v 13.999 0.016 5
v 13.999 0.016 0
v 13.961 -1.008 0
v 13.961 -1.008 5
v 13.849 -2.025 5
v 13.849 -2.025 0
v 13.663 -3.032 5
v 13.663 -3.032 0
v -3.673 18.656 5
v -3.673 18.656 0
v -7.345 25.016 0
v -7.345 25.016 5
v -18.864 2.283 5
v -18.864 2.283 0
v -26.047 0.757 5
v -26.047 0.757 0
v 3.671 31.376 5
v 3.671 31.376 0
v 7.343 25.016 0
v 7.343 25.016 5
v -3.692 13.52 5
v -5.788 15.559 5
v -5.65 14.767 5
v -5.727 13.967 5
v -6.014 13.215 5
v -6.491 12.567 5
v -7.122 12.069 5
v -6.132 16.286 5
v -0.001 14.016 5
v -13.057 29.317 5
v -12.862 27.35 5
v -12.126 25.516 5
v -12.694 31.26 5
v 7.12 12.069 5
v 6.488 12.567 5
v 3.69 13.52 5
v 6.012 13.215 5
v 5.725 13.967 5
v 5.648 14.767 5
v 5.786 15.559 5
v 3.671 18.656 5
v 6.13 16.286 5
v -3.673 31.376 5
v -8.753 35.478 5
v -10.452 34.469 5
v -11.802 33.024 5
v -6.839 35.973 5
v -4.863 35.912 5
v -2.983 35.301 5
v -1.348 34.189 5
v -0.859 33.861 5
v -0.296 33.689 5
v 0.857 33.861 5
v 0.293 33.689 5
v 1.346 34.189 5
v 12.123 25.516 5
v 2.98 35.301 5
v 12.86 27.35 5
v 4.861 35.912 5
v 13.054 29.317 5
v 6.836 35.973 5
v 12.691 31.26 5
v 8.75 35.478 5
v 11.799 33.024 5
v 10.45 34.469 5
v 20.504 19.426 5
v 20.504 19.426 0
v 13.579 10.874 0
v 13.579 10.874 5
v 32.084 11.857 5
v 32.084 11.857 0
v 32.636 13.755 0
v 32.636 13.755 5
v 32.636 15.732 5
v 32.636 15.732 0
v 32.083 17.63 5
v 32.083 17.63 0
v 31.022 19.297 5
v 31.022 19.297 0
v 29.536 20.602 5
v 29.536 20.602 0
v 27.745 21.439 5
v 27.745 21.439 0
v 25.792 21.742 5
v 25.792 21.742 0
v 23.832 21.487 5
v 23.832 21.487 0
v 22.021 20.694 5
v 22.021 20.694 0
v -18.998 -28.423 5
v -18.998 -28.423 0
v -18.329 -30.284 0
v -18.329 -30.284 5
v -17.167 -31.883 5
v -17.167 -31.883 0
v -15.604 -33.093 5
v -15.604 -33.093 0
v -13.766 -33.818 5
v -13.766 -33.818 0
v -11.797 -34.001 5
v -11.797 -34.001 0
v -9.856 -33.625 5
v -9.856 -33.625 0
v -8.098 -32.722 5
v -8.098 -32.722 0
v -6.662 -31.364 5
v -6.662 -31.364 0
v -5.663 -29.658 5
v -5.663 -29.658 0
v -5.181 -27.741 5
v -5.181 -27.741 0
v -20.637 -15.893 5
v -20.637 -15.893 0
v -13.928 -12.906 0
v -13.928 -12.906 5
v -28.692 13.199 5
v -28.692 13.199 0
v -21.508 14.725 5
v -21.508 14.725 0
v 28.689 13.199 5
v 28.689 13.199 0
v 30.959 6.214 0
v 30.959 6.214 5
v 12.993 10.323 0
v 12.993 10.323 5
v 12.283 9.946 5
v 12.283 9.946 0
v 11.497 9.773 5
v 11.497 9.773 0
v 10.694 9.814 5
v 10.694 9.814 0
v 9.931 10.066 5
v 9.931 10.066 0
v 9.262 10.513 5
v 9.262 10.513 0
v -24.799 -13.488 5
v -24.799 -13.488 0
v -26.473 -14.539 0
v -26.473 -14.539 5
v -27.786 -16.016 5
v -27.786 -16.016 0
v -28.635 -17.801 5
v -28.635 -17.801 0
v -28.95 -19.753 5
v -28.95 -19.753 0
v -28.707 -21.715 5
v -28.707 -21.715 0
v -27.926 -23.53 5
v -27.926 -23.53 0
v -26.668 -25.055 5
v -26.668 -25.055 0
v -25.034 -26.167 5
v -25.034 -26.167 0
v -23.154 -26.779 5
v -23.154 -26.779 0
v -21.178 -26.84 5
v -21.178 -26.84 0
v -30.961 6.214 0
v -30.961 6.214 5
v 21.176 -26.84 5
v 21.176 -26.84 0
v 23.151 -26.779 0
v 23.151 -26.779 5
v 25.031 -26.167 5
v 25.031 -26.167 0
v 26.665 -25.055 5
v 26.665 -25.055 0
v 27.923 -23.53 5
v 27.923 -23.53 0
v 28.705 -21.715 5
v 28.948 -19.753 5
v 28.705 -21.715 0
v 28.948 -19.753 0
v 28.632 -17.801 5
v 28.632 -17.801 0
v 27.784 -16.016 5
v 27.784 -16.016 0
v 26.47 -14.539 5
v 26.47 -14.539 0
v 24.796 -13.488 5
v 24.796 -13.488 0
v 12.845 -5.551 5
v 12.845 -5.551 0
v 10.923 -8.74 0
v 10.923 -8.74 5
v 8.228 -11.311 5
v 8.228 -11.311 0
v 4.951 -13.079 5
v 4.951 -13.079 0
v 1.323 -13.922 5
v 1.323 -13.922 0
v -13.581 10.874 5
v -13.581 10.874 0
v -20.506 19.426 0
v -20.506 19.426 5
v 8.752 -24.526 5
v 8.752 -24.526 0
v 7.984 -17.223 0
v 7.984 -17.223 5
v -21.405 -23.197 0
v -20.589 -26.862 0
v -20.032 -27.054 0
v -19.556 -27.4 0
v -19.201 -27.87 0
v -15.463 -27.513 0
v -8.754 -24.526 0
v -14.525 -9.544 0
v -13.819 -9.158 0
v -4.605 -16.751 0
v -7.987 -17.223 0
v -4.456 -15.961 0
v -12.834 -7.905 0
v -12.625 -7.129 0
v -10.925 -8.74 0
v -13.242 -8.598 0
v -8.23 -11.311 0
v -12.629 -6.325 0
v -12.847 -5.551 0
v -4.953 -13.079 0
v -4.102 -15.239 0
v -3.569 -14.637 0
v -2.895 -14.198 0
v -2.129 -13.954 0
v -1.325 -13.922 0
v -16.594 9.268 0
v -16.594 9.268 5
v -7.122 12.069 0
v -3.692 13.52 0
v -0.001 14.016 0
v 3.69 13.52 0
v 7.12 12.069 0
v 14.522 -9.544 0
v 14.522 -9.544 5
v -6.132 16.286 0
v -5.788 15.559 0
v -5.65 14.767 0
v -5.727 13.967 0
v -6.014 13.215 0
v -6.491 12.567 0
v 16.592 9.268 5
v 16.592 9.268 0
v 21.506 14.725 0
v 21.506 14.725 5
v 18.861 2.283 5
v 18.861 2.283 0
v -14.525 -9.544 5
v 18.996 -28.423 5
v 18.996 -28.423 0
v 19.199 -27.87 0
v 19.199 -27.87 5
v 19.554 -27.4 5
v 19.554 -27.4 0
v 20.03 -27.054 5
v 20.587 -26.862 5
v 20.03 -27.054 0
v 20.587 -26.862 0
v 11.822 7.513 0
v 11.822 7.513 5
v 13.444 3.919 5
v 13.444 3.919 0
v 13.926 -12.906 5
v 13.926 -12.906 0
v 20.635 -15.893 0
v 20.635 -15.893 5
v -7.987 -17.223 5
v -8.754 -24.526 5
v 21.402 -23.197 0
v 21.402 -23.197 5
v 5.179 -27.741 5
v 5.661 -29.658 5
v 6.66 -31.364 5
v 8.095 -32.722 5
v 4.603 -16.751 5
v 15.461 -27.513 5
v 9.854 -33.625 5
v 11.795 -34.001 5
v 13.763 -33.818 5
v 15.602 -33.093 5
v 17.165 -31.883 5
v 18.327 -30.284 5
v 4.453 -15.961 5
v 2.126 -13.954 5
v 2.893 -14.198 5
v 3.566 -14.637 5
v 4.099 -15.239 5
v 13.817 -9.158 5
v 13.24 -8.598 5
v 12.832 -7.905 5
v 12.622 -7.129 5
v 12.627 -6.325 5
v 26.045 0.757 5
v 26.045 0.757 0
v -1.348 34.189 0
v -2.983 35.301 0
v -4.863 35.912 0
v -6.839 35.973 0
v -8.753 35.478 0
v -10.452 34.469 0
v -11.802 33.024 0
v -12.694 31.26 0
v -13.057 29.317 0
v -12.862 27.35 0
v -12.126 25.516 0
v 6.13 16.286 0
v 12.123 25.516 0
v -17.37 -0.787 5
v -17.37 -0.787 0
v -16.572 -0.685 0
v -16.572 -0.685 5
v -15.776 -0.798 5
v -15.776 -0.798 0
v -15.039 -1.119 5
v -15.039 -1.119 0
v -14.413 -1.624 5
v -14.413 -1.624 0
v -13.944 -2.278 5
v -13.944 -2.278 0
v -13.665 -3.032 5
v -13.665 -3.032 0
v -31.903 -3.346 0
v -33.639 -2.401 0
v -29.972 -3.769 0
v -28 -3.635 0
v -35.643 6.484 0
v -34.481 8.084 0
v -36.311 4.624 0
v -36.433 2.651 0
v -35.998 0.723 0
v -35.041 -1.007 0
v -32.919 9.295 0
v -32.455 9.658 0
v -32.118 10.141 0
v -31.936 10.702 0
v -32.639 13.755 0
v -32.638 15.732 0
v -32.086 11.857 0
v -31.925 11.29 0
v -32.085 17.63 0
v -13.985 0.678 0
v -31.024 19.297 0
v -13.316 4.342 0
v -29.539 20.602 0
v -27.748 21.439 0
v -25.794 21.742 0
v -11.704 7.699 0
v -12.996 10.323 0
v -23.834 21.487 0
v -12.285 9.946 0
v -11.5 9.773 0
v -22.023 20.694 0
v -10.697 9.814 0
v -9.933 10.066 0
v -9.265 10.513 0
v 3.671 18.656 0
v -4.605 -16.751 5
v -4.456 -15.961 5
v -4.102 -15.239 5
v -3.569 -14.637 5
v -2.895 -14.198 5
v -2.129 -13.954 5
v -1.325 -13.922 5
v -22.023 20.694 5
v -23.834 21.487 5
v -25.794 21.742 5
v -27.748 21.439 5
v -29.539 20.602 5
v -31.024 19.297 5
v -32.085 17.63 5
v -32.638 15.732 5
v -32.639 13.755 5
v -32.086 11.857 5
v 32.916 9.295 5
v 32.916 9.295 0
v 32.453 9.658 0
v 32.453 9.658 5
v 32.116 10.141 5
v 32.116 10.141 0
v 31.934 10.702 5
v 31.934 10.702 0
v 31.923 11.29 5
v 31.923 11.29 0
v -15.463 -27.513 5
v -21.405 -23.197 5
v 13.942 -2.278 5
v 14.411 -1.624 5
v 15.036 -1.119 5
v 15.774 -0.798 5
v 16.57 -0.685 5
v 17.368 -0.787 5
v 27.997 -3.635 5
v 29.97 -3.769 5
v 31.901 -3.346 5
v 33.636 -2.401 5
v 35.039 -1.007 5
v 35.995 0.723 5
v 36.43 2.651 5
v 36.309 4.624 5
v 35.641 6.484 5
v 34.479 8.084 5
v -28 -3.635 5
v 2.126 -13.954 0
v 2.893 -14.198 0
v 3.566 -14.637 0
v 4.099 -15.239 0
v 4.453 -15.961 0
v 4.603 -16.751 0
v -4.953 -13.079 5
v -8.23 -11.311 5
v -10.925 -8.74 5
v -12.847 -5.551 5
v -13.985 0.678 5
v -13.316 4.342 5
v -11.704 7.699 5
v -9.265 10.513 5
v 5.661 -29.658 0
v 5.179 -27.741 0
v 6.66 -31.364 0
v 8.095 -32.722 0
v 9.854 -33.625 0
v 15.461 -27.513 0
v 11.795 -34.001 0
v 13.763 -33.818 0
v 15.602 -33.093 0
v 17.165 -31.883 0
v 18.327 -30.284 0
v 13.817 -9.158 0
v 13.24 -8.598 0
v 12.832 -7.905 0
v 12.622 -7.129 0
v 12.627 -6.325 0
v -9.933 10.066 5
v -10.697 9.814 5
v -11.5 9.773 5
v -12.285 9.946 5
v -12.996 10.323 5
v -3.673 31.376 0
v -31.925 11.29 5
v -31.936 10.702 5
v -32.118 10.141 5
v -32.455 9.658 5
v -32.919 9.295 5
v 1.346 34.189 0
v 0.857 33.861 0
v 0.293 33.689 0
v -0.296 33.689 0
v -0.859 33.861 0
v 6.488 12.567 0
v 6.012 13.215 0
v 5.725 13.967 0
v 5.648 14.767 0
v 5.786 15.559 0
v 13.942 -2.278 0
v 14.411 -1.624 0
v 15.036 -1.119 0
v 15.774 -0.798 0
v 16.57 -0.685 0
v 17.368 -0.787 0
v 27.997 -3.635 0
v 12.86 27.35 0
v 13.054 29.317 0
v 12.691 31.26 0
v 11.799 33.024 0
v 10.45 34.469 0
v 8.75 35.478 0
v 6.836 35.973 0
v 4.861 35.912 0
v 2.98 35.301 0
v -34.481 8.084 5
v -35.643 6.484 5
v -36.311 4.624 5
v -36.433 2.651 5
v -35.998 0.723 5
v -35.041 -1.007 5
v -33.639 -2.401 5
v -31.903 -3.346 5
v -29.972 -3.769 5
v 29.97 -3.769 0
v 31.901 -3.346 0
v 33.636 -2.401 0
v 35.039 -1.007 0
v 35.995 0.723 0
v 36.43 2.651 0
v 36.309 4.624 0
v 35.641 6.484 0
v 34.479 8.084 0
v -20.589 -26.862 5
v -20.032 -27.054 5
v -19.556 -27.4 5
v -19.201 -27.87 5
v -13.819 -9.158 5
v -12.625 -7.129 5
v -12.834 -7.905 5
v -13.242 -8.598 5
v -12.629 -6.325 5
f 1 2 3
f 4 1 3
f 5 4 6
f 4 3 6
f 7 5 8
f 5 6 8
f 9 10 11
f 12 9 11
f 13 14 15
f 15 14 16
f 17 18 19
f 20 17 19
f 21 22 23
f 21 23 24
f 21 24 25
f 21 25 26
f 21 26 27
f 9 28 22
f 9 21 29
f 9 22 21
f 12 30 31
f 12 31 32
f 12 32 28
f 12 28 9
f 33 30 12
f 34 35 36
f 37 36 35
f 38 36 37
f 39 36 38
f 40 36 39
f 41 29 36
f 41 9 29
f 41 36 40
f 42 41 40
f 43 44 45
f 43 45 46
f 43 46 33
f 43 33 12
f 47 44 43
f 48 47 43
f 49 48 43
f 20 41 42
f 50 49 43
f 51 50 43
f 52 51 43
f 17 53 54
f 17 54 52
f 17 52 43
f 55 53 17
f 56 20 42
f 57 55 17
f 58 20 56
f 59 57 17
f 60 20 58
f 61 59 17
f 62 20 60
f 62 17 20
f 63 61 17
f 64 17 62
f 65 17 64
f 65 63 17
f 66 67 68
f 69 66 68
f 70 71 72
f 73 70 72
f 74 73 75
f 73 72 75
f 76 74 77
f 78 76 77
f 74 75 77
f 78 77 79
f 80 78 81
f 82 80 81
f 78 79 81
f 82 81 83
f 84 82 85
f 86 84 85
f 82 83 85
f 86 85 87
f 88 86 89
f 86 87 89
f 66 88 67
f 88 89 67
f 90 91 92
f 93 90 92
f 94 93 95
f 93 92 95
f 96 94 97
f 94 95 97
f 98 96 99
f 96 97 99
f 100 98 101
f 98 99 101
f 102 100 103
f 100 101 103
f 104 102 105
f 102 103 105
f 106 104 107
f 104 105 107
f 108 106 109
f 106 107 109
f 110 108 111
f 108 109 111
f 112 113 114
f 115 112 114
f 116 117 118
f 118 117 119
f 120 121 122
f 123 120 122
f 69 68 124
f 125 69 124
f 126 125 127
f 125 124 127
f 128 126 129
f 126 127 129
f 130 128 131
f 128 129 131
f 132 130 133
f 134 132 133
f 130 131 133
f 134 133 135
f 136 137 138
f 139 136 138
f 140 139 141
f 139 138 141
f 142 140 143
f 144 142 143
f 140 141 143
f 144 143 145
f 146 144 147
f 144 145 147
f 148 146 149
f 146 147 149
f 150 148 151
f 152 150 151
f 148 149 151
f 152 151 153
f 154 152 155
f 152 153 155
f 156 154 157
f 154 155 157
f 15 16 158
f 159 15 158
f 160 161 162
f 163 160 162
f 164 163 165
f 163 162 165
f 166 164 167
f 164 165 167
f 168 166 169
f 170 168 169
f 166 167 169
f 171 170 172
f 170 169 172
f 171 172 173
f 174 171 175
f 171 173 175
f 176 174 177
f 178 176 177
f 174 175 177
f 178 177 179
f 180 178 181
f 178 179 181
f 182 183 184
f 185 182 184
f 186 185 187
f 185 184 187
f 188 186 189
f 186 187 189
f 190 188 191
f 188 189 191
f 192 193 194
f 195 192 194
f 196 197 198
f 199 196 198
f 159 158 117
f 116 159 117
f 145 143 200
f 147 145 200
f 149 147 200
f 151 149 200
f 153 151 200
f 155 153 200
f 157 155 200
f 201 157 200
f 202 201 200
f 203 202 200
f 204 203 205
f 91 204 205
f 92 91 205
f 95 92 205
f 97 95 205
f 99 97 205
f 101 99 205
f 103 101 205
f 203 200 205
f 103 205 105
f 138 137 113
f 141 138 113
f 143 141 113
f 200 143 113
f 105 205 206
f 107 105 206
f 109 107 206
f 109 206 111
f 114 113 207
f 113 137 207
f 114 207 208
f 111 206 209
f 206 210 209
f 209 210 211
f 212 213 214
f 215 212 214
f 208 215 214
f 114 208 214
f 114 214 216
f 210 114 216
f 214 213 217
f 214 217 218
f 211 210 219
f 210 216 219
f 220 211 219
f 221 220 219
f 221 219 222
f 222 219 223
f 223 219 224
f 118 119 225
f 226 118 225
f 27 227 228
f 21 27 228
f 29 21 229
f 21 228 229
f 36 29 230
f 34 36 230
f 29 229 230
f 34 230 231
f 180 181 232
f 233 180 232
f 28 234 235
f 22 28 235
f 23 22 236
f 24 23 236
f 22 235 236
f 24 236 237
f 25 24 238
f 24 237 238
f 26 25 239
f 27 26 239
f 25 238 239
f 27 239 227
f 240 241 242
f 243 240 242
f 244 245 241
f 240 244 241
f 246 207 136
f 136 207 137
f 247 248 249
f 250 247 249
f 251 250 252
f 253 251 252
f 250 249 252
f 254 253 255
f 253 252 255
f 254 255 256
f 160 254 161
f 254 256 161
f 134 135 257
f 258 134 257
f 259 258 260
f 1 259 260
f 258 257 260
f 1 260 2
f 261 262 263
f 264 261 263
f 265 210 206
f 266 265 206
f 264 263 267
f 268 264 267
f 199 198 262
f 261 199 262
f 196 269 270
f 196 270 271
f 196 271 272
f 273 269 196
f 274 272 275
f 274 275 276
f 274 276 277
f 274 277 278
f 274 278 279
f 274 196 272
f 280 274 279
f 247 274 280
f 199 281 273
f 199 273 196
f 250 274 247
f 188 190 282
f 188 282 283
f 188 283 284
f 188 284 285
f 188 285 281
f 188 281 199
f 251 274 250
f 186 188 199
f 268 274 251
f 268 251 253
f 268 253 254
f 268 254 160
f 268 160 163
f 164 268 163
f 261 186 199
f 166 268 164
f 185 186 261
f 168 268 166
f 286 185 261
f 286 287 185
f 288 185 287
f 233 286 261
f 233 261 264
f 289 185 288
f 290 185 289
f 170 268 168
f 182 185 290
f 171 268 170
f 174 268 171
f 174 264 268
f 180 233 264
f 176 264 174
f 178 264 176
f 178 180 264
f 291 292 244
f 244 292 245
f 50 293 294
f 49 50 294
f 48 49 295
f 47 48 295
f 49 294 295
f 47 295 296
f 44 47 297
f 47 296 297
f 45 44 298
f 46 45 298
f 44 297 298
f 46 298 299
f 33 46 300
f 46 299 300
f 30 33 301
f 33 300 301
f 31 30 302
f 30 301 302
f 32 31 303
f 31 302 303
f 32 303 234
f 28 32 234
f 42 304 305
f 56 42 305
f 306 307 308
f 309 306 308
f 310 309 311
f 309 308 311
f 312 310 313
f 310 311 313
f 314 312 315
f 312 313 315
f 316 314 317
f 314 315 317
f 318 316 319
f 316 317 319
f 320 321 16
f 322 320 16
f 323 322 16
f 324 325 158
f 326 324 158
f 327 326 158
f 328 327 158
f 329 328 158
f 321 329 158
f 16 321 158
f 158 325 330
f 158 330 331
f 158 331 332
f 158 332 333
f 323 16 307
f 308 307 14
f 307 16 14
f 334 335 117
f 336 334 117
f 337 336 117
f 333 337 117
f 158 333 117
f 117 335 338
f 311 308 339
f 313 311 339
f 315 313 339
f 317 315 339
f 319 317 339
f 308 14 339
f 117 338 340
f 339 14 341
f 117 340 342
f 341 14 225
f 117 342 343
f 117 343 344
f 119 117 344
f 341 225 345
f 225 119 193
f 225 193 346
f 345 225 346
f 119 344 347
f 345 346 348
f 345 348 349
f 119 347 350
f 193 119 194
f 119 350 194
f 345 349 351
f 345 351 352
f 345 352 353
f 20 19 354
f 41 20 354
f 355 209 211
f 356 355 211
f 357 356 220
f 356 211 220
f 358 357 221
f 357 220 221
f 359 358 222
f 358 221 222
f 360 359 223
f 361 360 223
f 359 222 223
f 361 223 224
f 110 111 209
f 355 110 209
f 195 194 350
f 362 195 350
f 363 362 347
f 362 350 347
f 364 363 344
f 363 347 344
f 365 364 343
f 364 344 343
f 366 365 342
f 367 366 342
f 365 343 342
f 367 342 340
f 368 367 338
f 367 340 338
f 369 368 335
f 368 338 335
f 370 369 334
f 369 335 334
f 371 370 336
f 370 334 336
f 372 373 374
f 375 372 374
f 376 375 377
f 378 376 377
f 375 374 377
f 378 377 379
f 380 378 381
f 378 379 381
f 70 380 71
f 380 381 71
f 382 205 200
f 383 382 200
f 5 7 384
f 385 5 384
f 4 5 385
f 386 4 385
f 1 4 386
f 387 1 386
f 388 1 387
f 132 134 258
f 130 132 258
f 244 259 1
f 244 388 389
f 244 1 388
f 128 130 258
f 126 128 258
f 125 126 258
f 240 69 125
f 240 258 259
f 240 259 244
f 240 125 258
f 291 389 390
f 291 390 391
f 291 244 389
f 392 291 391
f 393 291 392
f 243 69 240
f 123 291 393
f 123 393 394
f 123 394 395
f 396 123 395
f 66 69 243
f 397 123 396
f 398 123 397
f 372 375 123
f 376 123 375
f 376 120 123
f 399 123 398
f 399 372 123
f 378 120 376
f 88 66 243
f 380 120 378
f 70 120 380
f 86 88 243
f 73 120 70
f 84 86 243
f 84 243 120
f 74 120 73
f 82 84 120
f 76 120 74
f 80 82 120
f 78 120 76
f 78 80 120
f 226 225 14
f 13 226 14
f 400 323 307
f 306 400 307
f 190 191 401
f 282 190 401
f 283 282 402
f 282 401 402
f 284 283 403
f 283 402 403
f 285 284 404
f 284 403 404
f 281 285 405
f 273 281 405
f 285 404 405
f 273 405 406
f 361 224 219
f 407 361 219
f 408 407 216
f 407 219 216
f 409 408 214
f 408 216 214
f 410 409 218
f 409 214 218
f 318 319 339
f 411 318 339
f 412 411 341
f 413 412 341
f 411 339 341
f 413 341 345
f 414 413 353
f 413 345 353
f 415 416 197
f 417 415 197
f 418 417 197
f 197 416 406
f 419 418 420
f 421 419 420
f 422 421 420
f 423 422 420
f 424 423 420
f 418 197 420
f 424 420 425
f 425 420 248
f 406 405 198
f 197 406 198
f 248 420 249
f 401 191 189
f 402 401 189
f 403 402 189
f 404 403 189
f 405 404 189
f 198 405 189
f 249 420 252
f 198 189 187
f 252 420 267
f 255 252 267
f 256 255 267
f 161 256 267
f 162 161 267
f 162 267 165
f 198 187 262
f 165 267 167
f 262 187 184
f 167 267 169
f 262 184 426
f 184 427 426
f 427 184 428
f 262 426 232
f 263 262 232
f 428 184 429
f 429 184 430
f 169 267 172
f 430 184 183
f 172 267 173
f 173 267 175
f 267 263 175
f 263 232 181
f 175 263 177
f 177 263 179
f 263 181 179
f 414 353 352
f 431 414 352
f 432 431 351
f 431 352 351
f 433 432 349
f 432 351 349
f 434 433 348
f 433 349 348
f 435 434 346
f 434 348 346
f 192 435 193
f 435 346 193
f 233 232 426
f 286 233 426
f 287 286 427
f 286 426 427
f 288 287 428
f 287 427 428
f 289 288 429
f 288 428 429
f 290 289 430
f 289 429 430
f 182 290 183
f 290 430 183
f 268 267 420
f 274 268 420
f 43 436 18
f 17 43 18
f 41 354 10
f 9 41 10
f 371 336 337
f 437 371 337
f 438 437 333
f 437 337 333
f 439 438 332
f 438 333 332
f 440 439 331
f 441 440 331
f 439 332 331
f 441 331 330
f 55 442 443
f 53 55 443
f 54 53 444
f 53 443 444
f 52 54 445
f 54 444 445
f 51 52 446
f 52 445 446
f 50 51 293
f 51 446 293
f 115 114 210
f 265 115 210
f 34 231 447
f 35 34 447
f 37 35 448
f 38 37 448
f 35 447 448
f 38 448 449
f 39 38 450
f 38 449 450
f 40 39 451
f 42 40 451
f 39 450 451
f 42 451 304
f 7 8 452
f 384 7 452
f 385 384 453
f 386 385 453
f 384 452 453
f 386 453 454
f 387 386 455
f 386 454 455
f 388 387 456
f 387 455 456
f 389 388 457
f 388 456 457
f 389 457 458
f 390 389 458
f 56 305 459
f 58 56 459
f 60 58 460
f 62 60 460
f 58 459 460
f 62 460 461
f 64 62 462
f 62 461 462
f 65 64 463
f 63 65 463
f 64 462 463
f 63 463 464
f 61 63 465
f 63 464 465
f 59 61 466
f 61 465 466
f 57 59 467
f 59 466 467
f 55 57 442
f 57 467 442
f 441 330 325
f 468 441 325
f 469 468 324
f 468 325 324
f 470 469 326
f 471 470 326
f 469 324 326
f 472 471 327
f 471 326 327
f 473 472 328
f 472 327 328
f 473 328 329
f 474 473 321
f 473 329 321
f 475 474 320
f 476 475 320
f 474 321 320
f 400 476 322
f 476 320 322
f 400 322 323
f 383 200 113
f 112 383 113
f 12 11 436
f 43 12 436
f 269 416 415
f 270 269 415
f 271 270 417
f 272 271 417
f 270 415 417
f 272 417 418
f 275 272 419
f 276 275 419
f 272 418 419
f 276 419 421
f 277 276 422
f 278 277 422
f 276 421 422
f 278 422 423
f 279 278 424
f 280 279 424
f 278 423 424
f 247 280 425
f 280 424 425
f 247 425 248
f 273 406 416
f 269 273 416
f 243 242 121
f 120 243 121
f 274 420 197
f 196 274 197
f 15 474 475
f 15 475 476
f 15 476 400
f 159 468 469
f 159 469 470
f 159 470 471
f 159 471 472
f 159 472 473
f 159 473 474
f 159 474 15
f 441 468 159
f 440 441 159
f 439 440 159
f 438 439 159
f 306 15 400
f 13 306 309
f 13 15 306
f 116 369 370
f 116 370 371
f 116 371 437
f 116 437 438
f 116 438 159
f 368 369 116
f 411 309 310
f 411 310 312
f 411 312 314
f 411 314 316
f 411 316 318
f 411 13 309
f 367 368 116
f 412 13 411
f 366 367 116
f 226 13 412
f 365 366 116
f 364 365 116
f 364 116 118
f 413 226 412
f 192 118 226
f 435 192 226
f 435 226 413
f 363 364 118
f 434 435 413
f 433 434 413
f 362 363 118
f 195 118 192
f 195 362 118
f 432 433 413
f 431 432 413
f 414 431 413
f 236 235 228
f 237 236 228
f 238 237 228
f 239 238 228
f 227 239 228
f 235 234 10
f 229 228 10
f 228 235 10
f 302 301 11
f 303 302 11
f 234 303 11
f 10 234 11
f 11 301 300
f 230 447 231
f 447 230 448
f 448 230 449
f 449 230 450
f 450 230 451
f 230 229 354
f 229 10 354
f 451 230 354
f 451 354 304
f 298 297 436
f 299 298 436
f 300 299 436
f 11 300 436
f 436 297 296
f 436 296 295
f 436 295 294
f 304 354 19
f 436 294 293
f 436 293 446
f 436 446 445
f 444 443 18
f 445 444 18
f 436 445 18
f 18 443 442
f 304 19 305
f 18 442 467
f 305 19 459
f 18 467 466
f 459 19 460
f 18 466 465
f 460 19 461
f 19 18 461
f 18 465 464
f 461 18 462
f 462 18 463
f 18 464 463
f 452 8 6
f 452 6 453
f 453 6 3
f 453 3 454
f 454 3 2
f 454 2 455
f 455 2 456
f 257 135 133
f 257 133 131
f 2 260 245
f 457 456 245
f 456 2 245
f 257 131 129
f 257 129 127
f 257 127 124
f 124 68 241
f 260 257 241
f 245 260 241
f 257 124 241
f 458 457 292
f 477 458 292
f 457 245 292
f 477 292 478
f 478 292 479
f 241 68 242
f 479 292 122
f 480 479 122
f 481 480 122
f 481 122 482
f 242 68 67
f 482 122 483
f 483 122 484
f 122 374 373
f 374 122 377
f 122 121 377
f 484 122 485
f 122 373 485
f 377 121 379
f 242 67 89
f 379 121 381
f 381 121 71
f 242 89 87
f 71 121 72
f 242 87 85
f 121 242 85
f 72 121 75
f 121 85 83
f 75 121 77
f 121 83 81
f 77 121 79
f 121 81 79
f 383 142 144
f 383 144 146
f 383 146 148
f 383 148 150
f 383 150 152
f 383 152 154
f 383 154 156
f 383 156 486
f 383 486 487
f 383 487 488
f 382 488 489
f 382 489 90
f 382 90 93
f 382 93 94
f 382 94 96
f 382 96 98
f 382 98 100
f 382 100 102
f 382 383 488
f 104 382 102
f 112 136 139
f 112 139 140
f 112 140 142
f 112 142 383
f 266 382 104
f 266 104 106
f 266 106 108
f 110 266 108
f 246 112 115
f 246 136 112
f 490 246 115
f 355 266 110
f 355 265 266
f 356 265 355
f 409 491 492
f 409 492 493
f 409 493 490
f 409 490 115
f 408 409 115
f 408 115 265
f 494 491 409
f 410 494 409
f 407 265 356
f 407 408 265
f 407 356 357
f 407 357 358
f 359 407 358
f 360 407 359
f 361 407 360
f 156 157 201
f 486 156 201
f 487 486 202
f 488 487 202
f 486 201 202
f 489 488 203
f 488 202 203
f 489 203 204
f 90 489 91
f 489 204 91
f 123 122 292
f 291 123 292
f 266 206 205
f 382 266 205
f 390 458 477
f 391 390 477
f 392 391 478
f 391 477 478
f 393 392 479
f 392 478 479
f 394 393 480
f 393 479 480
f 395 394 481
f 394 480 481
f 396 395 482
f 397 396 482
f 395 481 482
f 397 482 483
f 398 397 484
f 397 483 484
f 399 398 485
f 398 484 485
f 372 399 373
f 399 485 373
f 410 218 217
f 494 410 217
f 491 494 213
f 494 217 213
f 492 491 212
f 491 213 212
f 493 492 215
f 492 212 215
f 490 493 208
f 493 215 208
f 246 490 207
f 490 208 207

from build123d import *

# Parameters (mm, degrees)
F1_DEPTH = 5


# Not quite as in the source:
# - a feature names something its author has since deleted; it is built from what else it names


with BuildPart() as f1:
    # F0 (on Top) → F1 (new body)
    with BuildSketch(Plane.XY):
        with BuildLine():
            ThreePointArc((-13.665469042, -3.0319204432), (-13.3159762762, 4.3418317), (-9.2645390994, 10.5127491897))
            ThreePointArc((-9.2645390994, 10.5127491897), (-11.4998669549, 9.7726015122), (-13.5809814233, 10.8741784618))
            Line((-13.5809814233, 10.8741784618), (-20.506494271, 19.426474585))
            ThreePointArc((-20.506494271, 19.426474585), (-29.538567909, 20.601795911), (-32.0861364699, 11.8571044442))
            ThreePointArc((-32.0861364699, 11.8571044442), (-32.0062029861, 10.4146544851), (-32.9187213461, 9.2946716776))
            ThreePointArc((-32.9187213461, 9.2946716776), (-35.997695766, 0.7226444411), (-27.9997581563, -3.6354203143))
            Line((-27.9997581563, -3.6354203143), (-17.3699870332, -0.7871817262))
            ThreePointArc((-17.3699870332, -0.7871817262), (-15.0388393758, -1.1192356462), (-13.665469042, -3.0319204432))
        make_face()
        Polygon((-28.6916231536, 13.1985965214), (-21.5082094645, 14.7254782362), (-16.5941842664, 9.267900353), (-18.8635727573, 2.2834407549), (-26.0469864464, 0.7565590401), (-30.9610116446, 6.2141369233), align=None, mode=Mode.SUBTRACT)
    extrude(amount=F1_DEPTH)


with BuildPart() as f1b:
    # F0 (on Top) → F1, piece 2 (new body)
    with BuildSketch(Plane.XY):
        with BuildLine():
            ThreePointArc((-1.3253227589, -13.9216462393), (-8.2301785802, -11.3106441425), (-12.847106931, -5.5505800398))
            ThreePointArc((-12.847106931, -5.5505800398), (-12.8339389546, -7.9052213736), (-14.5247006287, -9.5440728519))
            Line((-14.5247006287, -9.5440728519), (-24.7985187507, -13.4878221314))
            ThreePointArc((-24.7985187507, -13.4878221314), (-28.7073800051, -21.7146403569), (-21.1779261823, -26.8397803113))
            ThreePointArc((-21.1779261823, -26.8397803113), (-19.7813739443, -27.2095006015), (-18.998190678, -28.4234508549))
            ThreePointArc((-18.998190678, -28.4234508549), (-11.7971637379, -34.0006316328), (-5.1808992125, -27.7408570242))
            Line((-5.1808992125, -27.7408570242), (-4.6049551583, -16.7511898031))
            ThreePointArc((-4.6049551583, -16.7511898031), (-3.5687888714, -14.6367469374), (-1.3253227589, -13.9216462393))
        make_face()
        Polygon((-21.4047986615, -23.1968624525), (-20.6371525584, -15.8931976559), (-13.9281702523, -12.906166284), (-7.9868340493, -17.2227997087), (-8.7544801524, -24.5264645053), (-15.4634624585, -27.5134958771), align=None, mode=Mode.SUBTRACT)
    extrude(amount=F1_DEPTH)


with BuildPart() as f1c:
    # F0 (on Top) → F1, piece 3 (new body)
    with BuildSketch(Plane.XY):
        with BuildLine():
            ThreePointArc((7.1196691813, 12.0693664265), (5.7249926142, 13.9665713389), (6.1295548123, 16.2862348132))
            Line((6.1295548123, 16.2862348132), (12.1231706049, 25.5155937788))
            ThreePointArc((12.1231706049, 25.5155937788), (10.4499033622, 34.4688005315), (1.34596558, 34.1894239382))
            ThreePointArc((1.34596558, 34.1894239382), (-0.0011850481, 33.6676611266), (-1.3483356762, 34.1894239382))
            ThreePointArc((-1.3483356762, 34.1894239382), (-10.4522734584, 34.4688005315), (-12.1255407011, 25.5155937788))
            Line((-12.1255407011, 25.5155937788), (-6.1319249085, 16.2862348132))
            ThreePointArc((-6.1319249085, 16.2862348132), (-5.7273627104, 13.9665713389), (-7.1220392775, 12.0693664265))
            ThreePointArc((-7.1220392775, 12.0693664265), (-0.0011850481, 14.0155937788), (7.1196691813, 12.0693664265))
        make_face()
        Polygon((-7.3450804722, 25.0155937788), (-3.6731327602, 31.3755937788), (3.6707626639, 31.3755937788), (7.342710376, 25.0155937788), (3.6707626639, 18.6555937788), (-3.6731327602, 18.6555937788), align=None, mode=Mode.SUBTRACT)
    extrude(amount=F1_DEPTH)


with BuildPart() as f1d:
    # F0 (on Top) → F1, piece 4 (new body)
    with BuildSketch(Plane.XY):
        with BuildLine():
            ThreePointArc((14.5223305325, -9.5440728519), (12.8315688584, -7.9052213736), (12.8447368348, -5.5505800398))
            ThreePointArc((12.8447368348, -5.5505800398), (8.227808484, -11.3106441425), (1.3229526627, -13.9216462393))
            ThreePointArc((1.3229526627, -13.9216462393), (3.5664187752, -14.6367469374), (4.6025850621, -16.7511898031))
            Line((4.6025850621, -16.7511898031), (5.1785291162, -27.7408570242))
            ThreePointArc((5.1785291162, -27.7408570242), (11.7947936417, -34.0006316328), (18.9958205818, -28.4234508549))
            ThreePointArc((18.9958205818, -28.4234508549), (19.7790038481, -27.2095006015), (21.1755560861, -26.8397803113))
            ThreePointArc((21.1755560861, -26.8397803113), (28.7050099089, -21.7146403569), (24.7961486545, -13.4878221314))
            Line((24.7961486545, -13.4878221314), (14.5223305325, -9.5440728519))
        make_face()
        Polygon((7.9844639531, -17.2227997087), (13.9258001561, -12.906166284), (20.6347824622, -15.8931976559), (21.4024285653, -23.1968624525), (15.4610923623, -27.5134958771), (8.7521100562, -24.5264645053), align=None, mode=Mode.SUBTRACT)
    extrude(amount=F1_DEPTH)


with BuildPart() as f1e:
    # F0 (on Top) → F1, piece 5 (new body)
    with BuildSketch(Plane.XY):
        with BuildLine():
            ThreePointArc((13.5786113271, 10.8741784618), (11.4974968587, 9.7726015122), (9.2621690031, 10.5127491897))
            ThreePointArc((9.2621690031, 10.5127491897), (12.7598289539, 5.7737637694), (13.9988149519, 0.0155937788))
            ThreePointArc((13.9988149519, 0.0155937788), (13.9146328566, -1.5173811207), (13.6630989458, -3.0319204432))
            ThreePointArc((13.6630989458, -3.0319204432), (15.0364692796, -1.1192356462), (17.367616937, -0.7871817262))
            Line((17.367616937, -0.7871817262), (27.99738806, -3.6354203143))
            ThreePointArc((27.99738806, -3.6354203143), (35.9953256698, 0.7226444411), (32.9163512498, 9.2946716776))
            ThreePointArc((32.9163512498, 9.2946716776), (32.0038328898, 10.4146544851), (32.0837663737, 11.8571044442))
            ThreePointArc((32.0837663737, 11.8571044442), (29.5361978128, 20.601795911), (20.5041241748, 19.426474585))
            Line((20.5041241748, 19.426474585), (13.5786113271, 10.8741784618))
        make_face()
        Polygon((18.8612026611, 2.2834407549), (16.5918141702, 9.267900353), (21.5058393683, 14.7254782362), (28.6892530574, 13.1985965214), (30.9586415484, 6.2141369233), (26.0446163502, 0.7565590401), align=None, mode=Mode.SUBTRACT)
    extrude(amount=F1_DEPTH)


solid = Compound([f1.part, f1b.part, f1c.part, f1d.part, f1e.part])
